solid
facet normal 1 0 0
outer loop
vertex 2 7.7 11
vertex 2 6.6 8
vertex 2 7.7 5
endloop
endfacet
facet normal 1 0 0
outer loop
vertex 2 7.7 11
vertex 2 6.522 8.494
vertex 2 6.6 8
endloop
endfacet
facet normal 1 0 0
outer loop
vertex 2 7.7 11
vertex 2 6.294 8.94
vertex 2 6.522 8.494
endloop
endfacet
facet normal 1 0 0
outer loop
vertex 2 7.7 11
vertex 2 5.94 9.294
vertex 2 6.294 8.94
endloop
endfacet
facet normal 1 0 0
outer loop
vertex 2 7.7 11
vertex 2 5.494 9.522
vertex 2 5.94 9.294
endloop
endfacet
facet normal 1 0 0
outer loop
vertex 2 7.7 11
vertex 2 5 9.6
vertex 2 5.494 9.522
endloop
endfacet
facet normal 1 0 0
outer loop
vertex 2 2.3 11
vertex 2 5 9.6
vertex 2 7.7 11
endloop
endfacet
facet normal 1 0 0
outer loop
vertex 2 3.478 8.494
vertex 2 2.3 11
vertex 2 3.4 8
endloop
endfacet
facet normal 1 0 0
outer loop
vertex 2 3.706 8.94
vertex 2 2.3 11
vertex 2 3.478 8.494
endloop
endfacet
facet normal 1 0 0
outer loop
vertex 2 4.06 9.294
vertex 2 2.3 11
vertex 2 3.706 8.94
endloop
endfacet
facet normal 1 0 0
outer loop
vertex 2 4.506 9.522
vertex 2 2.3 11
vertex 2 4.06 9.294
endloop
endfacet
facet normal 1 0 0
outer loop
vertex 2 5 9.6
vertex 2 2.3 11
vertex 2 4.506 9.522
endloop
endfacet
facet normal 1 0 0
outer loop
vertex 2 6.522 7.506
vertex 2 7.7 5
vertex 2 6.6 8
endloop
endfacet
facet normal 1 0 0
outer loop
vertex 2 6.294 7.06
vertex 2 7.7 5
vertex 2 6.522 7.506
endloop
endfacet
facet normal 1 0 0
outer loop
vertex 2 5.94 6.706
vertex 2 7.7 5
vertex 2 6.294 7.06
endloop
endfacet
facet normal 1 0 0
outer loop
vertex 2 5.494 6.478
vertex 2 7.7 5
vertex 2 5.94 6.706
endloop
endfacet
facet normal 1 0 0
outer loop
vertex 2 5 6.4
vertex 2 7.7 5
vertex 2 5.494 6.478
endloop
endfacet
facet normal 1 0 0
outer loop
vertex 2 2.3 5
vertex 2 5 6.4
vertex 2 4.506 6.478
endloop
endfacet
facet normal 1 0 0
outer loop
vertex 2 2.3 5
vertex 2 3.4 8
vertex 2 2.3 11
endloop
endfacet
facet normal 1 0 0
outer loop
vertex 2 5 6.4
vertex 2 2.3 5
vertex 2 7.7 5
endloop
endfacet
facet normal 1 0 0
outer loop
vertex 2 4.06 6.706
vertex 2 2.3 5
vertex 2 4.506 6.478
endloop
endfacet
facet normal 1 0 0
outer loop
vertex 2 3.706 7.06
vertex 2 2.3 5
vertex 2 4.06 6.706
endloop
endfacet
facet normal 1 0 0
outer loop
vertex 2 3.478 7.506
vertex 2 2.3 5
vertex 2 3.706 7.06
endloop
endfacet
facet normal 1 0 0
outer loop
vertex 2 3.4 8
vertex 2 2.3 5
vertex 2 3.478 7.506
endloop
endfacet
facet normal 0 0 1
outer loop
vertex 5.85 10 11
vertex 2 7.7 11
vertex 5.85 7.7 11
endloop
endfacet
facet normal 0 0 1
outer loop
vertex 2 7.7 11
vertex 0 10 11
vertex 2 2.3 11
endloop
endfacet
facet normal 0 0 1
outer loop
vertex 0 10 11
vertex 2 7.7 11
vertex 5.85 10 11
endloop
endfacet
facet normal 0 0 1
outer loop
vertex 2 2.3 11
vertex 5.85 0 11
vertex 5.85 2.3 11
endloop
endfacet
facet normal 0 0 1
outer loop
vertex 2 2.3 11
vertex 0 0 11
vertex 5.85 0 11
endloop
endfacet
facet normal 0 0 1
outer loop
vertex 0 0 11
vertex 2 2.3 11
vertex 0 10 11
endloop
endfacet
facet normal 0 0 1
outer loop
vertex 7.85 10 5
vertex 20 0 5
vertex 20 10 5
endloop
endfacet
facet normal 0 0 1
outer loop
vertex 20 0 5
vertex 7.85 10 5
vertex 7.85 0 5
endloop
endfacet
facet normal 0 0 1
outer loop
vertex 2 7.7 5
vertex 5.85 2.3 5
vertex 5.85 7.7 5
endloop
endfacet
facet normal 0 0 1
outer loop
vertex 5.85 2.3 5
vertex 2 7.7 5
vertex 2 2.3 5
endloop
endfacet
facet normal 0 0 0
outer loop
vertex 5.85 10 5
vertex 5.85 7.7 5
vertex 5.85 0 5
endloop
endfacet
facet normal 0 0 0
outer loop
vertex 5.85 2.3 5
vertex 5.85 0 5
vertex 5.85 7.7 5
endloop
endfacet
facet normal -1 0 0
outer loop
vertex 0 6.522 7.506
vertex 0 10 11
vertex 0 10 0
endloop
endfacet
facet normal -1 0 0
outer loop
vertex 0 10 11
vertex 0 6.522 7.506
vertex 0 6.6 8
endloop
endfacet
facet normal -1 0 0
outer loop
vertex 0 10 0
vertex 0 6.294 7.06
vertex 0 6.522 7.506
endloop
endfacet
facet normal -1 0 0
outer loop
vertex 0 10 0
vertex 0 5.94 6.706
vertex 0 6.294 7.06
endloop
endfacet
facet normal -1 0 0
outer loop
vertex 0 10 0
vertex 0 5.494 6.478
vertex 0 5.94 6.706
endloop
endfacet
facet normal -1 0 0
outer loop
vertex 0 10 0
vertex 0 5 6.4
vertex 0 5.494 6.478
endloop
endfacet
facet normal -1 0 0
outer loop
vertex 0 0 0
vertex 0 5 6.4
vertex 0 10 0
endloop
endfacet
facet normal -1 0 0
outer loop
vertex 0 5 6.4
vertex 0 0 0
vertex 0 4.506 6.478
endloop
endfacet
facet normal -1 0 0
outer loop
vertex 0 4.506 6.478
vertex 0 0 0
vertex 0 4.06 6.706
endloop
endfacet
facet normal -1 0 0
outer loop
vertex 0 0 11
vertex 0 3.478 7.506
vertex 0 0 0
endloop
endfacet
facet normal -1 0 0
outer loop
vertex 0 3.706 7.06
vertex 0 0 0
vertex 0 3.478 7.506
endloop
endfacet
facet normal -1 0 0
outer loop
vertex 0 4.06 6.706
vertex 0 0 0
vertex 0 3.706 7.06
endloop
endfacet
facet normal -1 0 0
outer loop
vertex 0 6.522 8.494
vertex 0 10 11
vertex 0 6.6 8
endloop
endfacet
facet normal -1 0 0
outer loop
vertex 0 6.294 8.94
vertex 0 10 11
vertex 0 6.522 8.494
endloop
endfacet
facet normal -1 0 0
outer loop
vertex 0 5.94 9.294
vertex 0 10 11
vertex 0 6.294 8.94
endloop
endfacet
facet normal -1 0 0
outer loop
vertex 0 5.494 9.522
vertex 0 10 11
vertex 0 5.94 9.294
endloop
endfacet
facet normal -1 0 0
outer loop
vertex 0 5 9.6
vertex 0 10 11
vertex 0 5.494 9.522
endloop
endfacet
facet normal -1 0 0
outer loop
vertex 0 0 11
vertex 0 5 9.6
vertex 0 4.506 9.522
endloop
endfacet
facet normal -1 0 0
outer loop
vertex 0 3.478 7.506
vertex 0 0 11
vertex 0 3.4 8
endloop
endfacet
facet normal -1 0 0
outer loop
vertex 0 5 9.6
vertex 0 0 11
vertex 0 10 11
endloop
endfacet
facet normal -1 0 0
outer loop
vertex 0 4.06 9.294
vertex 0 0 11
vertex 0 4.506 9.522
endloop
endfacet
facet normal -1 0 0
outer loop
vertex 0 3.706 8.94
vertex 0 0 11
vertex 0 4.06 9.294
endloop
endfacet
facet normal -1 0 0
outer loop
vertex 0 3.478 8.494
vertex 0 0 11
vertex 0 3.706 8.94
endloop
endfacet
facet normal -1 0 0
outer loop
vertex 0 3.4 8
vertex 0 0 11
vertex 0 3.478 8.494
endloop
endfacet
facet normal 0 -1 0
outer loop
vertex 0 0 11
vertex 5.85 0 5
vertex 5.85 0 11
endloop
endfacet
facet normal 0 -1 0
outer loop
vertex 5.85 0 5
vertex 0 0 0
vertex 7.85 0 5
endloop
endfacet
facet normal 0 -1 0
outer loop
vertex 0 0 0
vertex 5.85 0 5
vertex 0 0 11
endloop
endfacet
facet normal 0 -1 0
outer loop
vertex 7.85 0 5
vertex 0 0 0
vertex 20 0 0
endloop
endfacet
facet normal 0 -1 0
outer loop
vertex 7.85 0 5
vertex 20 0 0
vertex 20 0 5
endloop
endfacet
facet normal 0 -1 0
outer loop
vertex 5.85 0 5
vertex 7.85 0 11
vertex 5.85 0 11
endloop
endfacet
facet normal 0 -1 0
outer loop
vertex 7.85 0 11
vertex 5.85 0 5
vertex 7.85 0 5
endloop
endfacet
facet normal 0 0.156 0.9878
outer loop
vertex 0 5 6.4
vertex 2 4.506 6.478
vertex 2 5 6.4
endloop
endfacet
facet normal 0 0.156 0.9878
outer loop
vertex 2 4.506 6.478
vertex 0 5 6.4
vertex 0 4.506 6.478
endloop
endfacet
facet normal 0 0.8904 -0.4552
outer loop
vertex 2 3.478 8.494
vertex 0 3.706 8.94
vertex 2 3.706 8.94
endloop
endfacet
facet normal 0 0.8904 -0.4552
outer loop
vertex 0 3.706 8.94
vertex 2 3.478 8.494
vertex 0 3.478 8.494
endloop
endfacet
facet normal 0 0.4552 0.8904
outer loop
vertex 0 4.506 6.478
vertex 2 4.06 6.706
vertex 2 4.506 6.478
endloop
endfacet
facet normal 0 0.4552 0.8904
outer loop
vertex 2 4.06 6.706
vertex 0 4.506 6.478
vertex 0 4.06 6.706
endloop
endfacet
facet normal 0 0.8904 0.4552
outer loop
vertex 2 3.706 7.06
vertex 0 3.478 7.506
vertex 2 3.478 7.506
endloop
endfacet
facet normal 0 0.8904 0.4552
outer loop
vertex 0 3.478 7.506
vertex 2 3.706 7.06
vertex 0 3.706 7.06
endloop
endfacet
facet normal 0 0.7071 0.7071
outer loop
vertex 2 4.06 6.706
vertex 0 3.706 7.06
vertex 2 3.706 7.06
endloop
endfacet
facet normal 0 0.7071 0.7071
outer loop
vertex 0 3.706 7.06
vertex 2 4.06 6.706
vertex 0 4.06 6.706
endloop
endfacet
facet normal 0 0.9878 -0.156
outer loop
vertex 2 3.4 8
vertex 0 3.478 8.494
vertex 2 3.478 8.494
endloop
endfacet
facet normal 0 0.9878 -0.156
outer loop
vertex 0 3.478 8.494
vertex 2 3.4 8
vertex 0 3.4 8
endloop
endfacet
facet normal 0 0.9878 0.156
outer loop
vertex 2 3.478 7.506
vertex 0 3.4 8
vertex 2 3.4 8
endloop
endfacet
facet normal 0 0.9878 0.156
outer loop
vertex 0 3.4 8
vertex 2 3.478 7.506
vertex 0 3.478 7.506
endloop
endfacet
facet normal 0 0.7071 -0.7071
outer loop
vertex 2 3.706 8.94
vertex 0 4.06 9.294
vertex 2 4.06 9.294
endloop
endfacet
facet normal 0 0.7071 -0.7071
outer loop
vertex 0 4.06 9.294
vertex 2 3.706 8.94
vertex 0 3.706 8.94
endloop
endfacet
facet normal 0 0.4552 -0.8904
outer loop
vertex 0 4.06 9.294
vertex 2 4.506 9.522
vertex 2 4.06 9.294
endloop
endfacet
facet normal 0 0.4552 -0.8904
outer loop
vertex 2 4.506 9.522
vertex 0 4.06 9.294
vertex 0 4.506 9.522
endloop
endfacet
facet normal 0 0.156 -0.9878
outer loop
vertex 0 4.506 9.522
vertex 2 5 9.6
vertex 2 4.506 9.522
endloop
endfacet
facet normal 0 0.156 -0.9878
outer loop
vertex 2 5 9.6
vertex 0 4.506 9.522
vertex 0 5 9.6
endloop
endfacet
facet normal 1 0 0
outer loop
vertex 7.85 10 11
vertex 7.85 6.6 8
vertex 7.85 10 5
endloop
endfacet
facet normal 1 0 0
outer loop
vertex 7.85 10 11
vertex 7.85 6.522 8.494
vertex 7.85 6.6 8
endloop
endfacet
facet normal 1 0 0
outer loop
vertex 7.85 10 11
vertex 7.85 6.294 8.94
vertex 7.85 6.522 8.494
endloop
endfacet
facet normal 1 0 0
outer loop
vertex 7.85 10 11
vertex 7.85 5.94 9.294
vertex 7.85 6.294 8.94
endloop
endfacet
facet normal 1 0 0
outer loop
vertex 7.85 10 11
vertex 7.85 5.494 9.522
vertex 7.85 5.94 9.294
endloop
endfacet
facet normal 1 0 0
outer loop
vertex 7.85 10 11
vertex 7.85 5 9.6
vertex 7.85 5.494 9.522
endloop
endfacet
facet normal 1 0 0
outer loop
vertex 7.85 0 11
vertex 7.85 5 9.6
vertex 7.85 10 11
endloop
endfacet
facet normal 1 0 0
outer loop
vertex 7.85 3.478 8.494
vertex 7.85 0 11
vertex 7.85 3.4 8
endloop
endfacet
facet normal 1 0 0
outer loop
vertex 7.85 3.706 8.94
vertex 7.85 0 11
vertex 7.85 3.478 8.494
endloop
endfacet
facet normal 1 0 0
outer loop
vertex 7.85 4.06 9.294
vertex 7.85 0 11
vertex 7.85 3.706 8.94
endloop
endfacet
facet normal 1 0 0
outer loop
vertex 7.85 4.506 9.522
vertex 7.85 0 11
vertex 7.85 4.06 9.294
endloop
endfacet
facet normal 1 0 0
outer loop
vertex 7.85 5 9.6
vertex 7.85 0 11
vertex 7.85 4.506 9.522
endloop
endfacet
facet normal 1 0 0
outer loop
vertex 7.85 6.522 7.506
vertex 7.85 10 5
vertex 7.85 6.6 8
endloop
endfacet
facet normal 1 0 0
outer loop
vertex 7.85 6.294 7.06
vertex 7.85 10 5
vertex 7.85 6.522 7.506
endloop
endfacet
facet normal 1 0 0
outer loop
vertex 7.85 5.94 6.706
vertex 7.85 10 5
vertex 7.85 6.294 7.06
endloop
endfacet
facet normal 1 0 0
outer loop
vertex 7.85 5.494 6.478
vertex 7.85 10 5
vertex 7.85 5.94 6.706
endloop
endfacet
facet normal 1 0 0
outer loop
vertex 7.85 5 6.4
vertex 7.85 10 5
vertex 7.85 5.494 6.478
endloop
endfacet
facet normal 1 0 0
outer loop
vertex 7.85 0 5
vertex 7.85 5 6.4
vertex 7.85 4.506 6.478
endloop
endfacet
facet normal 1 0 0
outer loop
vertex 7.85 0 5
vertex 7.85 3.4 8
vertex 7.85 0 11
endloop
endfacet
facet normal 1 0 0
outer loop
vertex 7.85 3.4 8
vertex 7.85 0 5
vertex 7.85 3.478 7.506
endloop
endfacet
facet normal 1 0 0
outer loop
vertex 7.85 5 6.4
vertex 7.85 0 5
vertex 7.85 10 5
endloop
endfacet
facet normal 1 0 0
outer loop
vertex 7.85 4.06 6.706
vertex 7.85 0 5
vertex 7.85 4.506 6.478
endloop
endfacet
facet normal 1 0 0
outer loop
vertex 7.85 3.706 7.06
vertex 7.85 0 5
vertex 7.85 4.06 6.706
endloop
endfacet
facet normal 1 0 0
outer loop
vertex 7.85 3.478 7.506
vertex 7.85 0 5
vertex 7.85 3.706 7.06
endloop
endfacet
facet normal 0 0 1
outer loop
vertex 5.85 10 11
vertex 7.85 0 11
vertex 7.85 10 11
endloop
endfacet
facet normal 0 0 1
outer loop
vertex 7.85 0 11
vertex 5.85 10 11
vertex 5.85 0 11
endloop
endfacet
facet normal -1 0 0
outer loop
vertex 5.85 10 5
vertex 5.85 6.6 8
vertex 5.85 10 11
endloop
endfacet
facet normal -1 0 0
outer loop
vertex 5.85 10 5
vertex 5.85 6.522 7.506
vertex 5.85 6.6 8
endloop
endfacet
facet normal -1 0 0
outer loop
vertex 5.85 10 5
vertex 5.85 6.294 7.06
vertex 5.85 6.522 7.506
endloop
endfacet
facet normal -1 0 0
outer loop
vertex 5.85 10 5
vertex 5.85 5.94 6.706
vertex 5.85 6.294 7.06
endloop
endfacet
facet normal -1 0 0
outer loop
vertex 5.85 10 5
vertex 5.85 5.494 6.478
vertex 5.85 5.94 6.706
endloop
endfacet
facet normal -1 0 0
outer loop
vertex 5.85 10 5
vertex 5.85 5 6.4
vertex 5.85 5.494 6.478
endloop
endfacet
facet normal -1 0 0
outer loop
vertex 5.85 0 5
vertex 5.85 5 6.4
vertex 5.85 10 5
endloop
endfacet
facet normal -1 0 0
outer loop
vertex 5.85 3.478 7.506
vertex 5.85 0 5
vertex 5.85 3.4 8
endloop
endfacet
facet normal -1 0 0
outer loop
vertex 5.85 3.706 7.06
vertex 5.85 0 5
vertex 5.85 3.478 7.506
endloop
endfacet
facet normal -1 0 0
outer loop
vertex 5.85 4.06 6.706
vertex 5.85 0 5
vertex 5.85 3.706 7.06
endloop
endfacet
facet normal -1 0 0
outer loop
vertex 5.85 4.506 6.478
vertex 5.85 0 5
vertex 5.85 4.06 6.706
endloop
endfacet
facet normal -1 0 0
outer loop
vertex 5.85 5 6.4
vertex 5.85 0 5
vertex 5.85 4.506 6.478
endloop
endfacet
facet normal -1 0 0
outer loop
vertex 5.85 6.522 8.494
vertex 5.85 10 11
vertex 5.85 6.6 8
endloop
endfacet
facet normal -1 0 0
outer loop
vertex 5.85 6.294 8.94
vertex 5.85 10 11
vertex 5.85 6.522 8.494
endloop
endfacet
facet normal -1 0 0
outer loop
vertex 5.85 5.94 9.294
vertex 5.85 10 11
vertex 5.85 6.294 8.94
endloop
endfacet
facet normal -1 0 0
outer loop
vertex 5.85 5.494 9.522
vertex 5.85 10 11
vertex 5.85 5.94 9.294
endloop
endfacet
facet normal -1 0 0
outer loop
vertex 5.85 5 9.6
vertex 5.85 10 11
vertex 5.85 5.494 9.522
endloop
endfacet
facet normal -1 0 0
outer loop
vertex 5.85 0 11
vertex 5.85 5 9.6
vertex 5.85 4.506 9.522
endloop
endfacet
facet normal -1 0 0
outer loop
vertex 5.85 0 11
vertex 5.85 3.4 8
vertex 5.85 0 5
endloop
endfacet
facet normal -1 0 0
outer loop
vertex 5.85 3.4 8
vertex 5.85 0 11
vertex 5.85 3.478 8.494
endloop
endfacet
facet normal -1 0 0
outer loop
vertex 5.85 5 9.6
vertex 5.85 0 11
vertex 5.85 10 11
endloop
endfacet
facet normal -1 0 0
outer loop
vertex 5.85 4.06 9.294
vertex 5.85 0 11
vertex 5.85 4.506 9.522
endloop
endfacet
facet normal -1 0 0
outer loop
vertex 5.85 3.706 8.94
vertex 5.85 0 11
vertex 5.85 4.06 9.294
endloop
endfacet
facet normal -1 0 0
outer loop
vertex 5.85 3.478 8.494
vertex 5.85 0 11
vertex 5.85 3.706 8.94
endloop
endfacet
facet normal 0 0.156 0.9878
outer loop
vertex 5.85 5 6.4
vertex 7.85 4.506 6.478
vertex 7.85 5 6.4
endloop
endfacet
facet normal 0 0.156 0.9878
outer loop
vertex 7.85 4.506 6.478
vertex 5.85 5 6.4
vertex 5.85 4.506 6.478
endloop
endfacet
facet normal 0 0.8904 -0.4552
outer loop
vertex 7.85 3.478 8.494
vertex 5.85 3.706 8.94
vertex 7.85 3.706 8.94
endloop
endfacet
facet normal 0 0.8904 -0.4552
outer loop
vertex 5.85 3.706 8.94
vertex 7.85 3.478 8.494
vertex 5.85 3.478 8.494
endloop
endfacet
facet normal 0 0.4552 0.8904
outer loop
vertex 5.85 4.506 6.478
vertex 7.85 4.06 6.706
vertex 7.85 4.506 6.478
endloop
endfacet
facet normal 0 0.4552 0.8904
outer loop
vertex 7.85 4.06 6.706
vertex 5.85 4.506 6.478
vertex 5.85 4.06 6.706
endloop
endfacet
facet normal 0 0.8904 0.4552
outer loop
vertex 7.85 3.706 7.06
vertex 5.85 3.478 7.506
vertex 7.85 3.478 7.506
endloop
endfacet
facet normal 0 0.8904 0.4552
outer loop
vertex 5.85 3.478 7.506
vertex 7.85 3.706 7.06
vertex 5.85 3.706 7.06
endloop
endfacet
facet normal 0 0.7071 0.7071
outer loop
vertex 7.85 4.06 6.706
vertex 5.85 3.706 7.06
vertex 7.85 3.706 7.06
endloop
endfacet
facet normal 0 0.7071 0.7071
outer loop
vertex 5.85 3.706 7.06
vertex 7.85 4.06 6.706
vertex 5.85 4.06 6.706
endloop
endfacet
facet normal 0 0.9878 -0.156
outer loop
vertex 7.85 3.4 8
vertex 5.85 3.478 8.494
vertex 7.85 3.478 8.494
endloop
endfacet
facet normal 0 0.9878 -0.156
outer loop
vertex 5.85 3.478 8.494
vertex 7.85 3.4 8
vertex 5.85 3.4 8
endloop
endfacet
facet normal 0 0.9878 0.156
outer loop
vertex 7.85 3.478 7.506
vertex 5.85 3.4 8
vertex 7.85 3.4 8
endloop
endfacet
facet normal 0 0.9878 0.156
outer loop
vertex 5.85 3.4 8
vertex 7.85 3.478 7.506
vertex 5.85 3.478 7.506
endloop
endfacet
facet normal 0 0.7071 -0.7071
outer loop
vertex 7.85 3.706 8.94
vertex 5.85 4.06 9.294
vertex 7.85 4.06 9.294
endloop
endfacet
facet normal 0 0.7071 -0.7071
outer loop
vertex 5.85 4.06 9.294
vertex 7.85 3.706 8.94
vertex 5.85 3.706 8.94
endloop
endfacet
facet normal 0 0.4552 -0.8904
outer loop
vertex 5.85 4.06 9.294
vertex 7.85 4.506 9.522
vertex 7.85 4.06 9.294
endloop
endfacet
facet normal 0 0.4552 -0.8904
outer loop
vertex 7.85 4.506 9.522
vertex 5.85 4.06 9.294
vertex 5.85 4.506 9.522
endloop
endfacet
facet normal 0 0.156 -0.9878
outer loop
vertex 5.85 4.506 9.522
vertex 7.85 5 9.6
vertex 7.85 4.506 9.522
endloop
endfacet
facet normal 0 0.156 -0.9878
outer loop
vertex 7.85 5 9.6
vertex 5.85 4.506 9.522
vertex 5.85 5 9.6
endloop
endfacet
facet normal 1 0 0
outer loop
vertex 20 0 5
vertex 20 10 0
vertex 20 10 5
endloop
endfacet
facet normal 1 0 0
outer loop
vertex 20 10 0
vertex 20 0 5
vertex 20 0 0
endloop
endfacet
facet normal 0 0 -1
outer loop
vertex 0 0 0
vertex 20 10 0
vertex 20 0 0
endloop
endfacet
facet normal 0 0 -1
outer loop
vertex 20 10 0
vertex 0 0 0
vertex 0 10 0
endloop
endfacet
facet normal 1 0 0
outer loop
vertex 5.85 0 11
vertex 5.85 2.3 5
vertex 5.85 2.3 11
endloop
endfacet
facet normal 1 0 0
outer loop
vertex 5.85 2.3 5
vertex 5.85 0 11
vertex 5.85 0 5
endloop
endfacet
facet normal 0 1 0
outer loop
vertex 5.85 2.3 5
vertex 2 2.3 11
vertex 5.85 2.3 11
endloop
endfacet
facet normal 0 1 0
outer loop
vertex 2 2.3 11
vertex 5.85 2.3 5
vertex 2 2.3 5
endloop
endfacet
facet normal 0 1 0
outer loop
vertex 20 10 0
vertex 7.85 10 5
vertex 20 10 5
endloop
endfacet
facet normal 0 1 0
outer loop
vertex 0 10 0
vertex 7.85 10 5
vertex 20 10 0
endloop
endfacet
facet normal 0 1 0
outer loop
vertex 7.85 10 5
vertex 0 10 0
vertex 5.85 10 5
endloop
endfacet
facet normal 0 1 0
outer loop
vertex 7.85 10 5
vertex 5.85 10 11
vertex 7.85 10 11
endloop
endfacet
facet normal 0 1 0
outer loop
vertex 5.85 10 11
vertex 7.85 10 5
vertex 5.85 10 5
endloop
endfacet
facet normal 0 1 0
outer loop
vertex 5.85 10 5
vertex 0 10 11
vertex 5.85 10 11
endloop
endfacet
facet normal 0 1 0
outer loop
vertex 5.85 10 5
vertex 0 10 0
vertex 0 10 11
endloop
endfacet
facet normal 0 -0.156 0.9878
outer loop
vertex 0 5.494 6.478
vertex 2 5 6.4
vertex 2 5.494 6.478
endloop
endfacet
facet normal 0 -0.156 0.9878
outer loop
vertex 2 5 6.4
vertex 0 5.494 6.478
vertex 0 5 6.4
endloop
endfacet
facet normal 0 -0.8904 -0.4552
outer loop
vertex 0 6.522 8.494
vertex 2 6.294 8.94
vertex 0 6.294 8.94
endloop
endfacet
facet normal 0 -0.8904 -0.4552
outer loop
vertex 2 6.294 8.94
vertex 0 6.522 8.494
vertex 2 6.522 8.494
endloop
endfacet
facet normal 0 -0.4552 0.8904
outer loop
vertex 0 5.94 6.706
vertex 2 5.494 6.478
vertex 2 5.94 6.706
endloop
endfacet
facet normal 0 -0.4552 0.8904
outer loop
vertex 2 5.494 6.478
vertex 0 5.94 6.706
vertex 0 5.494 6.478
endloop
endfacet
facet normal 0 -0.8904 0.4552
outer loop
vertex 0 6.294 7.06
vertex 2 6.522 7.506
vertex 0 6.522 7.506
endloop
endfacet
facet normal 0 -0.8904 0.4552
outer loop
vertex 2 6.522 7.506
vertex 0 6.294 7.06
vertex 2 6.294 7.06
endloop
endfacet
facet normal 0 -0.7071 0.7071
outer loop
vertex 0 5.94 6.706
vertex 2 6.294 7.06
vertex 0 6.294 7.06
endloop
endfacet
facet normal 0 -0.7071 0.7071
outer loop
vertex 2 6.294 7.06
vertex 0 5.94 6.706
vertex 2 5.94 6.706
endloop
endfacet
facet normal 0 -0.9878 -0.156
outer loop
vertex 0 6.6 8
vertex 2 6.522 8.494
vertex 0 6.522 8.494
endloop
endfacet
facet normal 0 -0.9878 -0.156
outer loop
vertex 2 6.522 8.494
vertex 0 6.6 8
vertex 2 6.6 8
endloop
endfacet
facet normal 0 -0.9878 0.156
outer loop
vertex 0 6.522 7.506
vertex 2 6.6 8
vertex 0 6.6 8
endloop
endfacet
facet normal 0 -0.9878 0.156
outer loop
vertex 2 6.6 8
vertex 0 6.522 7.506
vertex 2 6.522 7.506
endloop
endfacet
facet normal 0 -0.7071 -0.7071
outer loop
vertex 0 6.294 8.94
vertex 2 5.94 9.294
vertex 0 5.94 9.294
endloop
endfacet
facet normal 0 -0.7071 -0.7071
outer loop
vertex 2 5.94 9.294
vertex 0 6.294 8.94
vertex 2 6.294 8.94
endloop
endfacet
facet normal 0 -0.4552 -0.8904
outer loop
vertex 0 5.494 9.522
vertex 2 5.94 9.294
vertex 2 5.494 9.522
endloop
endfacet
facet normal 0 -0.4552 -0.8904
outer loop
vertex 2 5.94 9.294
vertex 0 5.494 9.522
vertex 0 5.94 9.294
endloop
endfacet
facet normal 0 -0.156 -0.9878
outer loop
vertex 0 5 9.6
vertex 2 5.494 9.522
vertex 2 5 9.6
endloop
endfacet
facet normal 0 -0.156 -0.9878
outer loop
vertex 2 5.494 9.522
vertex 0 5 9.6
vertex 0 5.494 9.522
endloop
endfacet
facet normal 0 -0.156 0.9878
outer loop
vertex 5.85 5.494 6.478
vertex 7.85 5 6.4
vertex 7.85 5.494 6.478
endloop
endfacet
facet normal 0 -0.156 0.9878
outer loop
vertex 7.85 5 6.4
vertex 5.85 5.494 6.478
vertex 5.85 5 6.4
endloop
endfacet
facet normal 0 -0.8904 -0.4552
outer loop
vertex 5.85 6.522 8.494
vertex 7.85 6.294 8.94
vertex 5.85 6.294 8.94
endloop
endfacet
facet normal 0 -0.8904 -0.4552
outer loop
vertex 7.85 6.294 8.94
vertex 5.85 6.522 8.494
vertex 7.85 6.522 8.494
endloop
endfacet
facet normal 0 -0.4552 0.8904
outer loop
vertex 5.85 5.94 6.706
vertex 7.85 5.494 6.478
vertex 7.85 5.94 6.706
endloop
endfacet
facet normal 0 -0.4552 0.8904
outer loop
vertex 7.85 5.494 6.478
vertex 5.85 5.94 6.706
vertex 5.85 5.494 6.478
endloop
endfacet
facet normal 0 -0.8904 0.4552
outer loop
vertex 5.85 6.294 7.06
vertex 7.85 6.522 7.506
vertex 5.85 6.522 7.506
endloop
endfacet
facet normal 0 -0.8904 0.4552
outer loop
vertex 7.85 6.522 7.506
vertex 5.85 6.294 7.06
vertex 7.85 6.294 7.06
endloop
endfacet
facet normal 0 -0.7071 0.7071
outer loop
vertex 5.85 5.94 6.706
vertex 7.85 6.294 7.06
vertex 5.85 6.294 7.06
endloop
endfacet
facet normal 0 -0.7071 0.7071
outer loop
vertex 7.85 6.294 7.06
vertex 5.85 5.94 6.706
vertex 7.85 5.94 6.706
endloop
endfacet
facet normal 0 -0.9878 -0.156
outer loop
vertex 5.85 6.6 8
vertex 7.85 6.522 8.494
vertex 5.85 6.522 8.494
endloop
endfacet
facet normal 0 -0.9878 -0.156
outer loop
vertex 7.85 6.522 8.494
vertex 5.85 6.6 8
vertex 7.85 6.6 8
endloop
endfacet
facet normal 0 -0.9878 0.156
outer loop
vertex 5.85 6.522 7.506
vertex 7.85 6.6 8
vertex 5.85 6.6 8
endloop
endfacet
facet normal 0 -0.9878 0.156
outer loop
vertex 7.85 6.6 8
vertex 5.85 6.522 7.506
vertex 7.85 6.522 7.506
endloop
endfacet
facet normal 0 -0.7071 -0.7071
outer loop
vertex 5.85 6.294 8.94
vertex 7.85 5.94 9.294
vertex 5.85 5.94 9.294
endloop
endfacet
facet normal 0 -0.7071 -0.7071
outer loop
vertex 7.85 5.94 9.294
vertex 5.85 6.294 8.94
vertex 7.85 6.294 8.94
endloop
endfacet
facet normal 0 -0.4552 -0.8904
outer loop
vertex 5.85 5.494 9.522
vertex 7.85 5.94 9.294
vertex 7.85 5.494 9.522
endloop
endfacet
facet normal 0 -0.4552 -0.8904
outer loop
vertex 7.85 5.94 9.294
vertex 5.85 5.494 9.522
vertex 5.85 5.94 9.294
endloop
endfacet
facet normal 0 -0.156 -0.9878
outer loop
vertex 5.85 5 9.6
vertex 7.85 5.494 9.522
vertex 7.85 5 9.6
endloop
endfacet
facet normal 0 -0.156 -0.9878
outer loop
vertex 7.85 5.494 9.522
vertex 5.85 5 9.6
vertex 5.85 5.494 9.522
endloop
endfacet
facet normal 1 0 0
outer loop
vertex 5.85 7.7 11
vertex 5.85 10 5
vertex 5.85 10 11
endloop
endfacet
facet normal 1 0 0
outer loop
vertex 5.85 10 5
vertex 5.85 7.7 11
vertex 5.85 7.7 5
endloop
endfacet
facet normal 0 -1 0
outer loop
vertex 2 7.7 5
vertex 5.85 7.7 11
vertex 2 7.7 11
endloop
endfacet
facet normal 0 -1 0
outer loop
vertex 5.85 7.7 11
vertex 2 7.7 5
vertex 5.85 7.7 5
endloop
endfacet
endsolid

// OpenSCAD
//------------------------------------------------------------
// Parametric easy adjust z-stop 
//
// http://www.thingiverse.com/wardwouts
// 
//
//------------------------------------------------------------

// Determines the heigth of the hole for the nut
nut_height = 3.85;
// Determines the width of the hole for the nut
nut_width_short = 5.4;
// Determines the depth of the hole for the nut
nut_width_long = 6.0;

// How thick should the bit above and below the nut be?
nut_holder_thickness = 2;

// of the piece
width = 10;
// Length of the base
base_length = 20;
// Thickness of the base
base_thickness = 5;

// How big should the screw hole be?
outer_thread = 3.2;

nut_holder_depth = nut_width_long;

// code below

module base() {
	// simple bar to glue to the x-idler
	cube([base_length,width/2,base_thickness]);
}

module end() {
	translate([0,0,base_thickness]){
		difference(){
			cube([nut_holder_thickness,width/2, nut_holder_depth]);
			translate([-nut_holder_thickness,width/2,nut_holder_depth/2]){
				rotate([0,90,0]){
					cylinder(h=nut_holder_thickness*3,r=outer_thread/2,$fn=20);
				}
			}
		}
	}
}

module side() {
	translate([nut_holder_thickness,0,base_thickness]){
		cube([nut_height,(width-nut_width_short)/2,nut_holder_depth]);
	}
}

module halfpart(){
	base();
	end();
	translate([nut_height+nut_holder_thickness,0,0]){
		end();
	}
	side();
}

halfpart();
translate([0,width,0]){
	mirror([0,1,0]){
		halfpart();
	}
}
